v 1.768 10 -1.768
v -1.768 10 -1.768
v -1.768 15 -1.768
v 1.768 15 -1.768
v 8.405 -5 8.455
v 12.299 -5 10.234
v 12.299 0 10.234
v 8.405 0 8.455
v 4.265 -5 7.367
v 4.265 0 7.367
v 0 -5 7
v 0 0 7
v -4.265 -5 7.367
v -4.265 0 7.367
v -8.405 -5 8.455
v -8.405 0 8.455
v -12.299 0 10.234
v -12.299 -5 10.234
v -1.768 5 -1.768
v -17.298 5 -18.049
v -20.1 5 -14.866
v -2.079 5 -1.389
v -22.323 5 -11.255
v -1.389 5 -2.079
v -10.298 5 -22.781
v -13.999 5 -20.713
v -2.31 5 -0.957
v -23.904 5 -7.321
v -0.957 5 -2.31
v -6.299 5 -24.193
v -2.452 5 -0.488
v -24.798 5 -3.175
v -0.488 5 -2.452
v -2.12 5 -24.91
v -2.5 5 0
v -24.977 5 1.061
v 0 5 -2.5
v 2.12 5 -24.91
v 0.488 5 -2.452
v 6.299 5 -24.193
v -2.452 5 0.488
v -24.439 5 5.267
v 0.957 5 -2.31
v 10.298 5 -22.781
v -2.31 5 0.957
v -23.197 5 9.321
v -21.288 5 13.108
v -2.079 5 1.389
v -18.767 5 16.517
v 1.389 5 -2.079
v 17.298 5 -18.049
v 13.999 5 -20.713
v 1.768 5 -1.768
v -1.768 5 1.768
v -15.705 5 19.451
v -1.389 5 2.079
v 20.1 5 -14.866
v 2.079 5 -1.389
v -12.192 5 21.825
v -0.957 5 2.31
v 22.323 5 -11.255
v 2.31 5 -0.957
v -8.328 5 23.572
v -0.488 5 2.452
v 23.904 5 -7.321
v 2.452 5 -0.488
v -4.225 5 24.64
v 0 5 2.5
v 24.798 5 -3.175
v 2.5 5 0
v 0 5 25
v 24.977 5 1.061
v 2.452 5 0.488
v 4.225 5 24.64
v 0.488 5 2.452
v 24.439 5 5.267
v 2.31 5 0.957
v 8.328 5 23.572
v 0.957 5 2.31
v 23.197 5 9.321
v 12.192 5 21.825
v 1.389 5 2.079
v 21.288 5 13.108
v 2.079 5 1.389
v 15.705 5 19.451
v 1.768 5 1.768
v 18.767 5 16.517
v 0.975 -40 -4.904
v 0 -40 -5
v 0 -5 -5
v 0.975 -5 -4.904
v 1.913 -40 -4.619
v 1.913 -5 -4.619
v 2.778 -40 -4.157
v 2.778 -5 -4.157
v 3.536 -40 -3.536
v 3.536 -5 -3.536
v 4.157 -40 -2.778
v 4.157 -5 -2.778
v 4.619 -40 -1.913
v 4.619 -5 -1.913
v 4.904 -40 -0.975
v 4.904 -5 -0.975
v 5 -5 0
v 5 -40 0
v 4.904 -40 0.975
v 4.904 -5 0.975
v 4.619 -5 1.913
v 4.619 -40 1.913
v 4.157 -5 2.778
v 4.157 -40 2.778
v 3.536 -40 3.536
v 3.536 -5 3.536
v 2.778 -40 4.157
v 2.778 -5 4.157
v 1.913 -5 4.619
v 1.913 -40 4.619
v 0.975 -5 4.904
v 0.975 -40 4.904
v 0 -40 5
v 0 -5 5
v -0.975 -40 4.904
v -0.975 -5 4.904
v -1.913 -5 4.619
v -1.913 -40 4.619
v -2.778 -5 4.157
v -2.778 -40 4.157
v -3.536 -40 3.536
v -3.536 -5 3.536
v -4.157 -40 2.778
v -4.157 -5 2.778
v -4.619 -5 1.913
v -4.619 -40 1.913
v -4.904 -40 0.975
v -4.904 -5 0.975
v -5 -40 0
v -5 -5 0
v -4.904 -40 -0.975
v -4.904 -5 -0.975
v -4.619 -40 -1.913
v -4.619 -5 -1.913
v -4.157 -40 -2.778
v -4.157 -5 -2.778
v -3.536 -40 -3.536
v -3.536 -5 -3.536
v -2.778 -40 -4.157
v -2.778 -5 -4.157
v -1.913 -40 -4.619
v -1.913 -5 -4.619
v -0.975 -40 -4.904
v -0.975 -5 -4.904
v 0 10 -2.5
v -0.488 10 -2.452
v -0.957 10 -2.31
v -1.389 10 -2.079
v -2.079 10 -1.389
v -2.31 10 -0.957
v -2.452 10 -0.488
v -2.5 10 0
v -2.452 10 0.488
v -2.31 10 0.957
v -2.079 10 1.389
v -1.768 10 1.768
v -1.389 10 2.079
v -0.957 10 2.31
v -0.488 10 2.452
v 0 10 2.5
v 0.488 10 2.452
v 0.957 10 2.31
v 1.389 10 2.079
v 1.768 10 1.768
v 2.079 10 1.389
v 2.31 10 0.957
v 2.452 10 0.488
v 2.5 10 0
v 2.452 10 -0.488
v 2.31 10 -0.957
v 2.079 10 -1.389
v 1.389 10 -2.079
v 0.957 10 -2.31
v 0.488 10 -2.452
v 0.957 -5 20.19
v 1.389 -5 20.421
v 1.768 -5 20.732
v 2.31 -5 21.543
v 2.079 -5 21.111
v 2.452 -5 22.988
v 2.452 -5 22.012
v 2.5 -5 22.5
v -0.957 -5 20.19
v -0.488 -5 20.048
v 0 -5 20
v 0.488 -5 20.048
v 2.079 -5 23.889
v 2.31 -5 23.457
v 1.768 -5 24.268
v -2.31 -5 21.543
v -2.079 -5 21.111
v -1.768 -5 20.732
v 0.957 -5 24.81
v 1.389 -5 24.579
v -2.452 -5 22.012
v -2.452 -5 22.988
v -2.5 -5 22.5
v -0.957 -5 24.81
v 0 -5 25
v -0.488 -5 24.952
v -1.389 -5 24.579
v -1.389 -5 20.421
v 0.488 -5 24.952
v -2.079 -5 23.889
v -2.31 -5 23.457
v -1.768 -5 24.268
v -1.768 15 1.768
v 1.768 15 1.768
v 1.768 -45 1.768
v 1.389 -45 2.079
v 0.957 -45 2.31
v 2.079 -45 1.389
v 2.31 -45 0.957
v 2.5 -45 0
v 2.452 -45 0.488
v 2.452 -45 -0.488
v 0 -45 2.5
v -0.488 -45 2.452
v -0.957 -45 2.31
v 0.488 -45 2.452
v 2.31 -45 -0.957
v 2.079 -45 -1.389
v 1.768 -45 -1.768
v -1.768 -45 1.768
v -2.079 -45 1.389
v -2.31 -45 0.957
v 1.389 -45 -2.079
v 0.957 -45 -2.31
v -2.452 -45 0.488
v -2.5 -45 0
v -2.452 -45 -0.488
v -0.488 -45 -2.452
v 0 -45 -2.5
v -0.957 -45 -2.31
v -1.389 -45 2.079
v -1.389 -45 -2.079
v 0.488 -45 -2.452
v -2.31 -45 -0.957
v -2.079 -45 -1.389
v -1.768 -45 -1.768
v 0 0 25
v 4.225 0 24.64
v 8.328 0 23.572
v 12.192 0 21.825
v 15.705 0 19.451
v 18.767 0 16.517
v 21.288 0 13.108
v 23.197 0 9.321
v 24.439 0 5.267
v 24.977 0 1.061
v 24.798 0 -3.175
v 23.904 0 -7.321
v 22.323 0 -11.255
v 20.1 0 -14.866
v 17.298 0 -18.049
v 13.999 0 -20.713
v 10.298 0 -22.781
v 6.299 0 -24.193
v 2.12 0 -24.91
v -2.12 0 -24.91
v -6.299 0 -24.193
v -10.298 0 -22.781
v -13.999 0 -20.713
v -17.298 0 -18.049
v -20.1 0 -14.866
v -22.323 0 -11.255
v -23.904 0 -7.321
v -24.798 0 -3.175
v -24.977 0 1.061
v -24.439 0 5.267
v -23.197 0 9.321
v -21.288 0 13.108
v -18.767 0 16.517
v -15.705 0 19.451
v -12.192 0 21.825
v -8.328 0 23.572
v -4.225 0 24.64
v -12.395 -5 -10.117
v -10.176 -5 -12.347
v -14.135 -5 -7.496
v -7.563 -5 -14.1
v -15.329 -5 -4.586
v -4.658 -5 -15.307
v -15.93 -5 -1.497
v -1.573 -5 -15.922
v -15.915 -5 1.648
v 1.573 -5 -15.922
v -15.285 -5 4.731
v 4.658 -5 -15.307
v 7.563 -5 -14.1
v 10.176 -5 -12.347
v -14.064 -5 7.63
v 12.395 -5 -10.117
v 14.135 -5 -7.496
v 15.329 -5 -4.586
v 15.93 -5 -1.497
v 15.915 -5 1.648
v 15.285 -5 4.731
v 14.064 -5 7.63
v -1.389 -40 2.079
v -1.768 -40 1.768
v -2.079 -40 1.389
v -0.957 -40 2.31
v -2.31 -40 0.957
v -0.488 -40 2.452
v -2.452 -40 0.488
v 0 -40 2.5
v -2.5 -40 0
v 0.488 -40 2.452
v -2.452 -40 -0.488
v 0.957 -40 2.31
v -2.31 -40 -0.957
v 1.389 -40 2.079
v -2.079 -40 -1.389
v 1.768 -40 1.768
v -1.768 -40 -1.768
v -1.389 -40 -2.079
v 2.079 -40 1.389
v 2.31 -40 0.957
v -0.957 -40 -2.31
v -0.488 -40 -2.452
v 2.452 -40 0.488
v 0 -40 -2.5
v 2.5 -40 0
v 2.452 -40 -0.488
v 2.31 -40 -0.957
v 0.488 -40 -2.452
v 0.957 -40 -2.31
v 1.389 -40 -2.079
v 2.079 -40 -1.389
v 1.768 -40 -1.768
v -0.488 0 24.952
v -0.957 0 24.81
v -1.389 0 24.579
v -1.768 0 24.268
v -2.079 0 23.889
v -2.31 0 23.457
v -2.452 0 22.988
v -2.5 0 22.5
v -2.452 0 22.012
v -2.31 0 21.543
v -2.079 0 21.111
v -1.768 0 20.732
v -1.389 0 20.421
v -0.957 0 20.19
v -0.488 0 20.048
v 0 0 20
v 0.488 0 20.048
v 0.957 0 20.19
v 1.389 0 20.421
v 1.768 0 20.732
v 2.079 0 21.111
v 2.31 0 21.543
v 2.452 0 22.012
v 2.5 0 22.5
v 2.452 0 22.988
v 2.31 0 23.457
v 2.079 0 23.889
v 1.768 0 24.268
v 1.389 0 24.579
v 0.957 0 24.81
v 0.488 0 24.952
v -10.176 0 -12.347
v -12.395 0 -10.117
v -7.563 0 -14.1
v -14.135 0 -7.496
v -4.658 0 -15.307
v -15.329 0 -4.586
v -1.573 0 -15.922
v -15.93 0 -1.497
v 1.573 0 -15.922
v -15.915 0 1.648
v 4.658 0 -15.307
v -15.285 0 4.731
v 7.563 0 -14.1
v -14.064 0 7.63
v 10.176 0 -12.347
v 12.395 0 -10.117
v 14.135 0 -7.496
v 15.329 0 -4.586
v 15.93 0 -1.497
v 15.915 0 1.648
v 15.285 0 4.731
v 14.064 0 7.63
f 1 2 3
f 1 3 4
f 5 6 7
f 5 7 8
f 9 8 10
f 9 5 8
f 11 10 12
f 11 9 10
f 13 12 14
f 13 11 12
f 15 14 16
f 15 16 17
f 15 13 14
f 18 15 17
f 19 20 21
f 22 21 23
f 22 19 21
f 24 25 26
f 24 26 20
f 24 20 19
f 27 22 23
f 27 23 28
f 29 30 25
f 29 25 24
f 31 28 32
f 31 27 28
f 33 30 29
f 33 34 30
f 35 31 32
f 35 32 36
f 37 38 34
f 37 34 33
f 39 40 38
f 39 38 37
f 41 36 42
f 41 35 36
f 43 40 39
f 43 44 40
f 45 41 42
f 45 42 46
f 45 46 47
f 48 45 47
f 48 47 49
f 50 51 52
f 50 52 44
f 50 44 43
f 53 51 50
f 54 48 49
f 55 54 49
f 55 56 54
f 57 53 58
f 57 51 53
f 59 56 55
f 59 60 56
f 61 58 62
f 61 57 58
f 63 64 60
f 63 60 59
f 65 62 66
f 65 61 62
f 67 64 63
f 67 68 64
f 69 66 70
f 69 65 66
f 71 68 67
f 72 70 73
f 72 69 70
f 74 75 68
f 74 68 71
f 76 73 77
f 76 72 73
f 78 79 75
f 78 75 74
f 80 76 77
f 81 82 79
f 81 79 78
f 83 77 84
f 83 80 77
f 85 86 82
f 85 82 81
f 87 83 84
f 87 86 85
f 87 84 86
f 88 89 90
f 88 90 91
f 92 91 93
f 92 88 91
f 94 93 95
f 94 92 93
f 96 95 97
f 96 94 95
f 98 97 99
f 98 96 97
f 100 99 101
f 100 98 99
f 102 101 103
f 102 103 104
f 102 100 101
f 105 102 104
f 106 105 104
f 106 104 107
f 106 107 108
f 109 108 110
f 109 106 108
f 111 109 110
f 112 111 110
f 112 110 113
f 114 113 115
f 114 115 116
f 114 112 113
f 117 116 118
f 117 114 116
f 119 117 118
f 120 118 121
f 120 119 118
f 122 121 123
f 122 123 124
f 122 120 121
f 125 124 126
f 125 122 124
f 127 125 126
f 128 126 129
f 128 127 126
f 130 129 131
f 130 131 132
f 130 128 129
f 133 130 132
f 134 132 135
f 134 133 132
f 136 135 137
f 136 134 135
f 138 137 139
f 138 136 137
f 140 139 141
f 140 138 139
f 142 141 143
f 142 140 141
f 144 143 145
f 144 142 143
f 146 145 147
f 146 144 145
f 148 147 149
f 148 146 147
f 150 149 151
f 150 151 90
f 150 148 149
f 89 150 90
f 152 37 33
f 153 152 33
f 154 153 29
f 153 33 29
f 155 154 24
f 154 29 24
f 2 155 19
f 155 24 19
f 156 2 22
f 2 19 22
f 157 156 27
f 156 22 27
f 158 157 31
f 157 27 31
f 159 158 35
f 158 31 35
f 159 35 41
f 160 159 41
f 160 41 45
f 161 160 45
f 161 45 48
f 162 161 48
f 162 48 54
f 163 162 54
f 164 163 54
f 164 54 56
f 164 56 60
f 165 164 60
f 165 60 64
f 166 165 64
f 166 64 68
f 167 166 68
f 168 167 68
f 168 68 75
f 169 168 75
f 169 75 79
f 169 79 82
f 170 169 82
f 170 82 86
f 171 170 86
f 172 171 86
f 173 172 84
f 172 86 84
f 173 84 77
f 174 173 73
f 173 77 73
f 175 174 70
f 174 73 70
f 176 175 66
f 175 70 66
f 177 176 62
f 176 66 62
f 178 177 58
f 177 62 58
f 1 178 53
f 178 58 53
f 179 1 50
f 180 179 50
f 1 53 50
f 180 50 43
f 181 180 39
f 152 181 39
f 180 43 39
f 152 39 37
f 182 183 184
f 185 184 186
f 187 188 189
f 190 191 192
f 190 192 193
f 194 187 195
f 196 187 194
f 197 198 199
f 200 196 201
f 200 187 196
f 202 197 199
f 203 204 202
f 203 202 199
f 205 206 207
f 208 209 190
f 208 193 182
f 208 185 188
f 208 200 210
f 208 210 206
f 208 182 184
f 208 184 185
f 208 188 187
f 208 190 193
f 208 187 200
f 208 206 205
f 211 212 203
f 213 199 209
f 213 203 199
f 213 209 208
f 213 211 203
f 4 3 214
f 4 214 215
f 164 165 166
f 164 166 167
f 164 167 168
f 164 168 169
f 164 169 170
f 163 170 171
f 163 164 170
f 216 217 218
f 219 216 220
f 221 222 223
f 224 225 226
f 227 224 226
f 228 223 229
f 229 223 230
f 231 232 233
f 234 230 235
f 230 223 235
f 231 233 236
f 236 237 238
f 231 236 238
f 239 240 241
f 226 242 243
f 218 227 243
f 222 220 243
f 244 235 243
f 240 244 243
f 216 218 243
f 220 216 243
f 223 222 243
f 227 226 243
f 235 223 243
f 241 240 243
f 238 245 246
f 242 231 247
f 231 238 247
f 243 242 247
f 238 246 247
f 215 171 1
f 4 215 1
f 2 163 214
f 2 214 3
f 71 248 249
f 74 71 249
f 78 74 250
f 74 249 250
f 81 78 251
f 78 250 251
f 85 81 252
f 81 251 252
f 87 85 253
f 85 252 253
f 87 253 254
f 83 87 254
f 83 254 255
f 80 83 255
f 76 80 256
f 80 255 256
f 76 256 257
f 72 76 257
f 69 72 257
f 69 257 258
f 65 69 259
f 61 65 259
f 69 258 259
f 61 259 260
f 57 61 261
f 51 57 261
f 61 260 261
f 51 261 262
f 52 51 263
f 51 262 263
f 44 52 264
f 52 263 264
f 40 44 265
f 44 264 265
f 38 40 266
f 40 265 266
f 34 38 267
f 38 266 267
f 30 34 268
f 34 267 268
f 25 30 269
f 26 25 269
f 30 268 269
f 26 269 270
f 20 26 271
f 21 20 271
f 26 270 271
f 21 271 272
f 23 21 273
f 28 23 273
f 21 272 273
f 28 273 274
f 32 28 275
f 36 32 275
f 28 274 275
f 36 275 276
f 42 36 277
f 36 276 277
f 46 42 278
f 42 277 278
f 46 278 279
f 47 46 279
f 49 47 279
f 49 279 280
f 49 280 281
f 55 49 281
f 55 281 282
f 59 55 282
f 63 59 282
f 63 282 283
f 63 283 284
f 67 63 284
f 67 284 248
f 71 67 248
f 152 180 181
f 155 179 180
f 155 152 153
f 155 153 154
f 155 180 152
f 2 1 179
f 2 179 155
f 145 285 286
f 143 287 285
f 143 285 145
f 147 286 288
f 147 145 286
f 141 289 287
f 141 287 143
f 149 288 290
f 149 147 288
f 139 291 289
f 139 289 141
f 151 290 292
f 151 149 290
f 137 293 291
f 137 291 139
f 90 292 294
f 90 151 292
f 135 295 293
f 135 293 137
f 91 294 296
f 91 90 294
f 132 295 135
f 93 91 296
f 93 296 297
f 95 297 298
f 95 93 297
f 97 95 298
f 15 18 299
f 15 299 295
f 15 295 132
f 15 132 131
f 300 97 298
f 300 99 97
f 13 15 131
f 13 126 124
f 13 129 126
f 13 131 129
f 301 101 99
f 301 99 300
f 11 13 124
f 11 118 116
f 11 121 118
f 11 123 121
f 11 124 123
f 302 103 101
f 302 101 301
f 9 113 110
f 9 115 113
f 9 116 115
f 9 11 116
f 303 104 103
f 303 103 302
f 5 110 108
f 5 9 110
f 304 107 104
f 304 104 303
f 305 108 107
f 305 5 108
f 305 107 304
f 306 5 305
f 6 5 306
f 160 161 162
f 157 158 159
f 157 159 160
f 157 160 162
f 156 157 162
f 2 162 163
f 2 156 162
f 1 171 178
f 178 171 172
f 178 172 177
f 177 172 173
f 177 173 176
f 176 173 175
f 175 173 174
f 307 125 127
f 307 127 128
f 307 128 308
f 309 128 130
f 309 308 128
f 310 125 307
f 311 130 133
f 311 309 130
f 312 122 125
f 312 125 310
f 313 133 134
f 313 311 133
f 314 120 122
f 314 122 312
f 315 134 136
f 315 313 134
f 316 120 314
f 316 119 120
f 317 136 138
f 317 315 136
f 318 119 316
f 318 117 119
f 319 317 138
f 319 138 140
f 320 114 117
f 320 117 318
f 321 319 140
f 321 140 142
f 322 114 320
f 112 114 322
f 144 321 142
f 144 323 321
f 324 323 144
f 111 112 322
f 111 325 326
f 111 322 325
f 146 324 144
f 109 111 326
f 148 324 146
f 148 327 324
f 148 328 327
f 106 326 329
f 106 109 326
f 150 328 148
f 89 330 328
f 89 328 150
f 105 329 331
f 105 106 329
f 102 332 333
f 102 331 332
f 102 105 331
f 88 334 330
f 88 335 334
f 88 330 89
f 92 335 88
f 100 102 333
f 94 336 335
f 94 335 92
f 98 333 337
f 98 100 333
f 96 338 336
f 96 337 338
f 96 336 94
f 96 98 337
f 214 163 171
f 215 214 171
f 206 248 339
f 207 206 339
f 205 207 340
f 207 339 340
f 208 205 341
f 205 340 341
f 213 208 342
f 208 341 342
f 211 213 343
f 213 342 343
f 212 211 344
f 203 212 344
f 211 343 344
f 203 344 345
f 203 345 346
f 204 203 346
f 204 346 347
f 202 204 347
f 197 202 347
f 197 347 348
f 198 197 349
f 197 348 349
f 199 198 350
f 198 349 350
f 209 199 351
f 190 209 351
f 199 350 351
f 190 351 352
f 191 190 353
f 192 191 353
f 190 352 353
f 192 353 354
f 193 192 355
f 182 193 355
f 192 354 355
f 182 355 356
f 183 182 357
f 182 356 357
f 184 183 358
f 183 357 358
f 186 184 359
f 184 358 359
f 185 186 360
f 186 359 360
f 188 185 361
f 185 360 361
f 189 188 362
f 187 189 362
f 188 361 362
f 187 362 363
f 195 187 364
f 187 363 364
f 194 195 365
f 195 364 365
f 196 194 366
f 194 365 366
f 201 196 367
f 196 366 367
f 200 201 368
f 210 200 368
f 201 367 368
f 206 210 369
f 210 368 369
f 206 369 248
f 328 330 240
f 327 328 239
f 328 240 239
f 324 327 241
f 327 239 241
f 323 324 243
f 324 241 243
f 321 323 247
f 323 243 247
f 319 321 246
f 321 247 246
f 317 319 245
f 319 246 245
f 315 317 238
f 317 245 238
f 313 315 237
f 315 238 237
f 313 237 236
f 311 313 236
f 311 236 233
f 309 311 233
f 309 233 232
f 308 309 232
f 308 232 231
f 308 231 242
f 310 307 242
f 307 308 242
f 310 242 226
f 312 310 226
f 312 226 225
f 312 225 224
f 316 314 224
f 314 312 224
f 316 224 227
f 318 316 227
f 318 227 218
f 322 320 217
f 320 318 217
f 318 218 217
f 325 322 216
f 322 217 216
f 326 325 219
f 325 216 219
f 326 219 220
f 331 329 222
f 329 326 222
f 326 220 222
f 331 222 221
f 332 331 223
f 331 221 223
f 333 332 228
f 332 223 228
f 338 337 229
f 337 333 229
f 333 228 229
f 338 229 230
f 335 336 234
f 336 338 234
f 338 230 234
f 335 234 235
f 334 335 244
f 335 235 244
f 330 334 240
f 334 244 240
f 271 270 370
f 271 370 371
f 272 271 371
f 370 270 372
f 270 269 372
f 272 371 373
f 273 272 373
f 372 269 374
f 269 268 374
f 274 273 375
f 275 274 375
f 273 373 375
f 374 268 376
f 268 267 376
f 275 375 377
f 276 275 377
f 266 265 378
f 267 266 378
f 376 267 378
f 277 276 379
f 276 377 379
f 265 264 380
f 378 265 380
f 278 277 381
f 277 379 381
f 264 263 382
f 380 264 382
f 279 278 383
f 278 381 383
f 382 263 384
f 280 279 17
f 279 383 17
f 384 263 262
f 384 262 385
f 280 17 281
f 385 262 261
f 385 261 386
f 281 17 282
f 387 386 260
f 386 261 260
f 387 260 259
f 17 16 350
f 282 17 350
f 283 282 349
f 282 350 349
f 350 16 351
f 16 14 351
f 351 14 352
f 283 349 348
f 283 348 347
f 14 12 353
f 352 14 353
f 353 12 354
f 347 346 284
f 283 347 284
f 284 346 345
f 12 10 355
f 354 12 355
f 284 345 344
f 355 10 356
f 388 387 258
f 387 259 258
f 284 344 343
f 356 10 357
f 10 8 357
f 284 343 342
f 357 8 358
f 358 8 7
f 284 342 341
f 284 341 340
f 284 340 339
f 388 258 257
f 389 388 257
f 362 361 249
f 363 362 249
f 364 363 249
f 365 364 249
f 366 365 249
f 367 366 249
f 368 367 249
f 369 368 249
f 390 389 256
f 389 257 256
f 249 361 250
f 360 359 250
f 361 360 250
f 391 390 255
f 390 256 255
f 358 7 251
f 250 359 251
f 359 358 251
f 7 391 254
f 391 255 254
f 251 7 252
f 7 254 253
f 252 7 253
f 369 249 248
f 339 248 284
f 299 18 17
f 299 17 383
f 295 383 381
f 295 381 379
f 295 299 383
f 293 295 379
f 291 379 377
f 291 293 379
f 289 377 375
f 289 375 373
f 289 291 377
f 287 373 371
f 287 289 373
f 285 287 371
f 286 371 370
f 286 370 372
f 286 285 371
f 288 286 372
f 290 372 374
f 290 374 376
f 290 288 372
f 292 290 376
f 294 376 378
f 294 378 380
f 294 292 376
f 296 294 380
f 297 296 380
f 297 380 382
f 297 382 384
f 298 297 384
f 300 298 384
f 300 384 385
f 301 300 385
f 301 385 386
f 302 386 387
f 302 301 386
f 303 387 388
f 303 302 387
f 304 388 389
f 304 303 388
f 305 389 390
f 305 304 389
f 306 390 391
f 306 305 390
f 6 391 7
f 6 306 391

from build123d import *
from build123d.topology import SkipClean

# Parameters (mm, degrees)
SKETCH1_R           = 25
SKETCH1_R_2         = 2.5
BOSS_EXTRUDE1_DEPTH = 5
SKETCH2_R           = 2.5
BOSS_EXTRUDE2_DEPTH = 5
BOSS_EXTRUDE3_START = 5
SKETCH3_R           = 2.5
BOSS_EXTRUDE3_DEPTH = 5
BOSS_EXTRUDE4_START = 35
SKETCH4_R           = 5
SKETCH4_R_2         = 2.5
BOSS_EXTRUDE4_DEPTH = 35
BOSS_EXTRUDE5_START = -50
SKETCH5_R           = 2.5
BOSS_EXTRUDE5_DEPTH = 55
SKETCH6_W           = 3.535533906
SKETCH6_H           = 3.535533906
BOSS_EXTRUDE6_DEPTH = 5


with BuildPart() as part:
    # Sketch1 → Boss-Extrude1 (new body)
    with BuildSketch(Plane(origin=(0, 0, 0), x_dir=(1, 0, 0), z_dir=(0, 1, 0))):
        with Locations(Location((0, 0, 0), (0, 0, 270))):
            Circle(SKETCH1_R)
        with Locations(Location((0, 0, 0), (0, 0, 270))):
            Circle(SKETCH1_R_2, mode=Mode.SUBTRACT)
    extrude(amount=BOSS_EXTRUDE1_DEPTH)

    # Sketch2 → Boss-Extrude2 (add)
    with BuildSketch(Plane.XZ):
        with Locations(Location((0, 22.5, 0), (0, 0, 90))):
            Circle(SKETCH2_R)
    extrude(amount=BOSS_EXTRUDE2_DEPTH)

    # Sketch3 → Boss-Extrude3 (add)
    with SkipClean():  # the faces are left unmerged after this step: merging them gives an invalid solid
        with BuildSketch(Plane.XZ.offset(BOSS_EXTRUDE3_START)):
            with BuildLine():
                ThreePointArc((-12.29868157, 10.234375), (0, -16), (12.29868157, 10.234375))
                ThreePointArc((12.29868157, 10.234375), (0, 7), (-12.29868157, 10.234375))
            make_face()
            with Locations(Location((0, 0, 0), (0, 0, 270))):
                Circle(SKETCH3_R, mode=Mode.SUBTRACT)
        extrude(amount=-BOSS_EXTRUDE3_DEPTH)

    # Sketch4 → Boss-Extrude4 (add)
    with SkipClean():  # the faces are left unmerged after this step: merging them gives an invalid solid
        with BuildSketch(Plane.XZ.offset(5).offset(BOSS_EXTRUDE4_START)):
            with Locations(Location((0, 0, 0), (0, 0, 270))):
                Circle(SKETCH4_R)
            with Locations(Location((0, 0, 0), (0, 0, 270))):
                Circle(SKETCH4_R_2, mode=Mode.SUBTRACT)
        extrude(amount=-BOSS_EXTRUDE4_DEPTH)

    # Sketch5 → Boss-Extrude5 (add)
    with BuildSketch(Plane(origin=(0, 5, 0), x_dir=(1, 0, 0), z_dir=(0, 1, 0)).offset(BOSS_EXTRUDE5_START)):
        with Locations(Location((0, 0, 0), (0, 0, 90))):
            Circle(SKETCH5_R)
    extrude(amount=BOSS_EXTRUDE5_DEPTH)

    # Sketch6 → Boss-Extrude6 (add)
    with BuildSketch(Plane(origin=(0, 10, 0), x_dir=(1, 0, 0), z_dir=(0, 1, 0))):
        Rectangle(SKETCH6_W, SKETCH6_H)
    extrude(amount=BOSS_EXTRUDE6_DEPTH)


solid = part.part
